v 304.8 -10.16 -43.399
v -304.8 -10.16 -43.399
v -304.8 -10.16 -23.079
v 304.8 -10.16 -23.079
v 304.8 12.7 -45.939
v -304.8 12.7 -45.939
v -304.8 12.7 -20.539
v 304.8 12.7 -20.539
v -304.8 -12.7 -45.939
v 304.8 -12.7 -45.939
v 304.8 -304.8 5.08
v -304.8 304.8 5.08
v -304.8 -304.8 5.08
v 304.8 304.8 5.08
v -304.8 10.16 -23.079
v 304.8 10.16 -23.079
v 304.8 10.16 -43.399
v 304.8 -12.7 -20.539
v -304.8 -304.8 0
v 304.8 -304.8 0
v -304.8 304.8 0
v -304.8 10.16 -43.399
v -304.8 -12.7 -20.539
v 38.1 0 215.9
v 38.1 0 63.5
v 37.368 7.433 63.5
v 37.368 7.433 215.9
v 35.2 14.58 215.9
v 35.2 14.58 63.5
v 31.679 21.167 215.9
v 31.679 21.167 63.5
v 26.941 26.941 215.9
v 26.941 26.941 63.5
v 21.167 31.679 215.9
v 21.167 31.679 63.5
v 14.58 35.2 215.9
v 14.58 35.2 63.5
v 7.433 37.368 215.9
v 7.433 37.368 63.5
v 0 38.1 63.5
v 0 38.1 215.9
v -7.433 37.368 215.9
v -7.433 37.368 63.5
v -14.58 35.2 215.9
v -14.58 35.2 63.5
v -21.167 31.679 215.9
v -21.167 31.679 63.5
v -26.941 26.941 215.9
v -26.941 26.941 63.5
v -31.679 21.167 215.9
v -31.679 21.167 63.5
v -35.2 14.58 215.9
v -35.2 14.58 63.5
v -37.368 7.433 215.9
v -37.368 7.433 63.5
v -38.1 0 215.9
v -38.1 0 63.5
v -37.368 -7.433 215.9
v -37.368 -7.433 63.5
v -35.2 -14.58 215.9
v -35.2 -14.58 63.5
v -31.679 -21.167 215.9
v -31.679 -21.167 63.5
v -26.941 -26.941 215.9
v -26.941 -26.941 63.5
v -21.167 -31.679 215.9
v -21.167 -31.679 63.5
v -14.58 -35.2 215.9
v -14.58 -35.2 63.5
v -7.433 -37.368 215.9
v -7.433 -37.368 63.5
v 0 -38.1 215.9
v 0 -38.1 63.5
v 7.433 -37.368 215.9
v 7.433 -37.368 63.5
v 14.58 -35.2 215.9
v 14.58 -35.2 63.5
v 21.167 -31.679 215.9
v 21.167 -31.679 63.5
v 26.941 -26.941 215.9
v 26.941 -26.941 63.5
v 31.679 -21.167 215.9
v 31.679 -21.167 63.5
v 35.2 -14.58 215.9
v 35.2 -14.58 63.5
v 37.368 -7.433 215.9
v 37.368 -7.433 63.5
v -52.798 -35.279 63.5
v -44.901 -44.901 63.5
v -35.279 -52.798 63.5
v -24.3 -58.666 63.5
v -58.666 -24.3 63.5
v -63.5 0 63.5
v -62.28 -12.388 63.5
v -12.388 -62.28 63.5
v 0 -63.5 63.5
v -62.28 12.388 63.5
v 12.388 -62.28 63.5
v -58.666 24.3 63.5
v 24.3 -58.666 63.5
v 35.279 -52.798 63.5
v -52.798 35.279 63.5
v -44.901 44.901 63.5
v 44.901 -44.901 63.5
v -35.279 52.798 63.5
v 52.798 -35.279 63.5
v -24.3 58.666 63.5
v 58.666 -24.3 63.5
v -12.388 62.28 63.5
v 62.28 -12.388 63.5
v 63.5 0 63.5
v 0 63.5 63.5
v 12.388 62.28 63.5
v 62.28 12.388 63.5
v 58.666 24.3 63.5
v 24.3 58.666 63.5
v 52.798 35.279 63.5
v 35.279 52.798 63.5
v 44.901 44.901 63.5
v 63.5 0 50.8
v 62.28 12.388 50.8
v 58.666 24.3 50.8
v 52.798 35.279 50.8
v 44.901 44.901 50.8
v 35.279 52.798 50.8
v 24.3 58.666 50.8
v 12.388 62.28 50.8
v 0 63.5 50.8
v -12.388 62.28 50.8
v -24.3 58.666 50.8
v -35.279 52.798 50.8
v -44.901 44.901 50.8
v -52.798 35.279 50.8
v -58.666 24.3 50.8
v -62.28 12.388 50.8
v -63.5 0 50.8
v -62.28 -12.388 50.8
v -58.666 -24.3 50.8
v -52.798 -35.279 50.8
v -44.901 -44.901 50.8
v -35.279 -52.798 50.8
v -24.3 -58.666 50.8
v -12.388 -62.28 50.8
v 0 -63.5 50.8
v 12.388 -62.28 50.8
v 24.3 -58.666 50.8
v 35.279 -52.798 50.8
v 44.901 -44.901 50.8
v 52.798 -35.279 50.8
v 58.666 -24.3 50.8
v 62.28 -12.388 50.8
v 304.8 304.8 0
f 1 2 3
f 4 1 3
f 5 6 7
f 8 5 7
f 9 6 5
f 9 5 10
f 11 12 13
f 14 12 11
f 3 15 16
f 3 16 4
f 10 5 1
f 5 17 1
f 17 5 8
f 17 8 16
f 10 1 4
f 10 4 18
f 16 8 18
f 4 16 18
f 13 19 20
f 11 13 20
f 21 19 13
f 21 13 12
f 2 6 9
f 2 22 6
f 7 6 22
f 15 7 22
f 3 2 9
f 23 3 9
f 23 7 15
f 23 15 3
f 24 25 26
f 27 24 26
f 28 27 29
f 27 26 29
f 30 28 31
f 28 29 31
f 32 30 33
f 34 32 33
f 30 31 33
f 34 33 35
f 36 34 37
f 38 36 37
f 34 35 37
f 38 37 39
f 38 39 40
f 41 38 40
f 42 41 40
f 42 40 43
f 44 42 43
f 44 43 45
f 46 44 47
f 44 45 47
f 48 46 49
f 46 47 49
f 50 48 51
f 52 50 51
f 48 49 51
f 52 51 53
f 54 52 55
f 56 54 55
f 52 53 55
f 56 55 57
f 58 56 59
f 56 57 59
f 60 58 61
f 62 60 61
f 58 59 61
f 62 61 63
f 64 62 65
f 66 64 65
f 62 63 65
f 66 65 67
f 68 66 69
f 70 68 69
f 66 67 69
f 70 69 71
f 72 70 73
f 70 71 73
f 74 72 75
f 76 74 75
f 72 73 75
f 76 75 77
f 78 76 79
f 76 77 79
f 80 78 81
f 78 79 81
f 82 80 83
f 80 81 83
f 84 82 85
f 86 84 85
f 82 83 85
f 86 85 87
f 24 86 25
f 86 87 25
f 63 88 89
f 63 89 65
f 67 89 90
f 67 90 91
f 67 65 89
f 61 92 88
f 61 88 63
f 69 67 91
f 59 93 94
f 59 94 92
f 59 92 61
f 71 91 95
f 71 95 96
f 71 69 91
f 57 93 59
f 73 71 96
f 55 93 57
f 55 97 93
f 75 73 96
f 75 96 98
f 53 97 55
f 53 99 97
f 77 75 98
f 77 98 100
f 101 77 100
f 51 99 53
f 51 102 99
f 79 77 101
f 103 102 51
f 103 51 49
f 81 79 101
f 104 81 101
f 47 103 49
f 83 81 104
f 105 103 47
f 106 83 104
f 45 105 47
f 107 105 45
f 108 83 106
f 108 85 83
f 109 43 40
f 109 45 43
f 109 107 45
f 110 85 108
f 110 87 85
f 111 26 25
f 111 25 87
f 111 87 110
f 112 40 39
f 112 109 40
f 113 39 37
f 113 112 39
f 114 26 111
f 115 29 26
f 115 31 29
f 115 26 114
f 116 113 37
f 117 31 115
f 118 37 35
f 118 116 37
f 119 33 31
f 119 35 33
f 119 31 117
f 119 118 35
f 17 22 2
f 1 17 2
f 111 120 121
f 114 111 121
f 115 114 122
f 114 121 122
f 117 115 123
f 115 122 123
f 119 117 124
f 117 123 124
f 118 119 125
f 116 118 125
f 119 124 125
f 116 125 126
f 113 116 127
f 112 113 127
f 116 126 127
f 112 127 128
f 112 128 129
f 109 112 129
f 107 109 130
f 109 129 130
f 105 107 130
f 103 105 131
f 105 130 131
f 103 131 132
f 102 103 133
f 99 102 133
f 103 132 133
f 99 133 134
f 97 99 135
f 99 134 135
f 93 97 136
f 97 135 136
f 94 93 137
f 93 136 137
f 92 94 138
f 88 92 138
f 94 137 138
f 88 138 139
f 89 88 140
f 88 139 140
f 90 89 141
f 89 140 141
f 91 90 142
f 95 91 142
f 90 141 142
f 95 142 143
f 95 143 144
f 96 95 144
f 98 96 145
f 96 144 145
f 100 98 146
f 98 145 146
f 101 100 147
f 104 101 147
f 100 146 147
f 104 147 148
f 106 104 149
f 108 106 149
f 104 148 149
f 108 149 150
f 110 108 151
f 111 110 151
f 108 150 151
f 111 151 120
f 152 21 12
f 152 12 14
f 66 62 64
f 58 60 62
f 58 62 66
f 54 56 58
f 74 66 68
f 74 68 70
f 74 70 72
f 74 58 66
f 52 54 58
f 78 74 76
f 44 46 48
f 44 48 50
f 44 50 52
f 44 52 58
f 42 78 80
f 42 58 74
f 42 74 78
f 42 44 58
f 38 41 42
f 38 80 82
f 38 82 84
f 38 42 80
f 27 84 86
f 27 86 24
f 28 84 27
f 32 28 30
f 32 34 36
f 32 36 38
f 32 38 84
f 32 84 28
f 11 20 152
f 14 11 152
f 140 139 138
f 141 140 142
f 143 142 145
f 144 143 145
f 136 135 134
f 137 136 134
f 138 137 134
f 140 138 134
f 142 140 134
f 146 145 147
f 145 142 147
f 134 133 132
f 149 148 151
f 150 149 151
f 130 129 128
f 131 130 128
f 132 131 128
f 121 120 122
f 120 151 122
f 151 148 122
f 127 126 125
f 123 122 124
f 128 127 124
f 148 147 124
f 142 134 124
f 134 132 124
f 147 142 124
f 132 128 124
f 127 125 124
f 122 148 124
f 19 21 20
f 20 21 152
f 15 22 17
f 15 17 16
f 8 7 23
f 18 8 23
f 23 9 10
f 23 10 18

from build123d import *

# Parameters (mm, degrees)
F0_W     = 609.6
F0_H     = 609.6
F1_DEPTH = 5.08
F2_W     = 25.4
F2_H     = 25.4
F2_W_2   = 20.32
F2_H_2   = 20.32
F3_DEPTH = 609.6
F5_R     = 63.5
F6_DEPTH = 12.7
F7_R     = 38.1
F8_DEPTH = 152.4


with BuildPart() as f1:
    # F0 (on Top) → F1 (new body)
    with BuildSketch(Plane.XY):
        Rectangle(F0_W, F0_H)
    extrude(amount=F1_DEPTH)


with BuildPart() as f3:
    # F2 (on face) → F3 (new body)
    with BuildSketch(Plane(origin=(-304.8, 0, 0), x_dir=(0, -1, 0), z_dir=(-1, 0, 0))):
        with Locations((0, -33.238985)):
            Rectangle(F2_W, F2_H)
        with Locations((0, -33.238985)):
            Rectangle(F2_W_2, F2_H_2, mode=Mode.SUBTRACT)
    extrude(amount=-F3_DEPTH)


with BuildPart() as f6:
    # F5 (on offset) → F6 (new body)
    with BuildSketch(Plane.XY.offset(50.8)):
        Circle(F5_R)
    extrude(amount=F6_DEPTH)

    # F7 (on face) → F8 (join)
    with BuildSketch(Plane.XY.offset(63.5)):
        Circle(F7_R)
    extrude(amount=F8_DEPTH)


solid = Compound([f1.part, f3.part, f6.part])
